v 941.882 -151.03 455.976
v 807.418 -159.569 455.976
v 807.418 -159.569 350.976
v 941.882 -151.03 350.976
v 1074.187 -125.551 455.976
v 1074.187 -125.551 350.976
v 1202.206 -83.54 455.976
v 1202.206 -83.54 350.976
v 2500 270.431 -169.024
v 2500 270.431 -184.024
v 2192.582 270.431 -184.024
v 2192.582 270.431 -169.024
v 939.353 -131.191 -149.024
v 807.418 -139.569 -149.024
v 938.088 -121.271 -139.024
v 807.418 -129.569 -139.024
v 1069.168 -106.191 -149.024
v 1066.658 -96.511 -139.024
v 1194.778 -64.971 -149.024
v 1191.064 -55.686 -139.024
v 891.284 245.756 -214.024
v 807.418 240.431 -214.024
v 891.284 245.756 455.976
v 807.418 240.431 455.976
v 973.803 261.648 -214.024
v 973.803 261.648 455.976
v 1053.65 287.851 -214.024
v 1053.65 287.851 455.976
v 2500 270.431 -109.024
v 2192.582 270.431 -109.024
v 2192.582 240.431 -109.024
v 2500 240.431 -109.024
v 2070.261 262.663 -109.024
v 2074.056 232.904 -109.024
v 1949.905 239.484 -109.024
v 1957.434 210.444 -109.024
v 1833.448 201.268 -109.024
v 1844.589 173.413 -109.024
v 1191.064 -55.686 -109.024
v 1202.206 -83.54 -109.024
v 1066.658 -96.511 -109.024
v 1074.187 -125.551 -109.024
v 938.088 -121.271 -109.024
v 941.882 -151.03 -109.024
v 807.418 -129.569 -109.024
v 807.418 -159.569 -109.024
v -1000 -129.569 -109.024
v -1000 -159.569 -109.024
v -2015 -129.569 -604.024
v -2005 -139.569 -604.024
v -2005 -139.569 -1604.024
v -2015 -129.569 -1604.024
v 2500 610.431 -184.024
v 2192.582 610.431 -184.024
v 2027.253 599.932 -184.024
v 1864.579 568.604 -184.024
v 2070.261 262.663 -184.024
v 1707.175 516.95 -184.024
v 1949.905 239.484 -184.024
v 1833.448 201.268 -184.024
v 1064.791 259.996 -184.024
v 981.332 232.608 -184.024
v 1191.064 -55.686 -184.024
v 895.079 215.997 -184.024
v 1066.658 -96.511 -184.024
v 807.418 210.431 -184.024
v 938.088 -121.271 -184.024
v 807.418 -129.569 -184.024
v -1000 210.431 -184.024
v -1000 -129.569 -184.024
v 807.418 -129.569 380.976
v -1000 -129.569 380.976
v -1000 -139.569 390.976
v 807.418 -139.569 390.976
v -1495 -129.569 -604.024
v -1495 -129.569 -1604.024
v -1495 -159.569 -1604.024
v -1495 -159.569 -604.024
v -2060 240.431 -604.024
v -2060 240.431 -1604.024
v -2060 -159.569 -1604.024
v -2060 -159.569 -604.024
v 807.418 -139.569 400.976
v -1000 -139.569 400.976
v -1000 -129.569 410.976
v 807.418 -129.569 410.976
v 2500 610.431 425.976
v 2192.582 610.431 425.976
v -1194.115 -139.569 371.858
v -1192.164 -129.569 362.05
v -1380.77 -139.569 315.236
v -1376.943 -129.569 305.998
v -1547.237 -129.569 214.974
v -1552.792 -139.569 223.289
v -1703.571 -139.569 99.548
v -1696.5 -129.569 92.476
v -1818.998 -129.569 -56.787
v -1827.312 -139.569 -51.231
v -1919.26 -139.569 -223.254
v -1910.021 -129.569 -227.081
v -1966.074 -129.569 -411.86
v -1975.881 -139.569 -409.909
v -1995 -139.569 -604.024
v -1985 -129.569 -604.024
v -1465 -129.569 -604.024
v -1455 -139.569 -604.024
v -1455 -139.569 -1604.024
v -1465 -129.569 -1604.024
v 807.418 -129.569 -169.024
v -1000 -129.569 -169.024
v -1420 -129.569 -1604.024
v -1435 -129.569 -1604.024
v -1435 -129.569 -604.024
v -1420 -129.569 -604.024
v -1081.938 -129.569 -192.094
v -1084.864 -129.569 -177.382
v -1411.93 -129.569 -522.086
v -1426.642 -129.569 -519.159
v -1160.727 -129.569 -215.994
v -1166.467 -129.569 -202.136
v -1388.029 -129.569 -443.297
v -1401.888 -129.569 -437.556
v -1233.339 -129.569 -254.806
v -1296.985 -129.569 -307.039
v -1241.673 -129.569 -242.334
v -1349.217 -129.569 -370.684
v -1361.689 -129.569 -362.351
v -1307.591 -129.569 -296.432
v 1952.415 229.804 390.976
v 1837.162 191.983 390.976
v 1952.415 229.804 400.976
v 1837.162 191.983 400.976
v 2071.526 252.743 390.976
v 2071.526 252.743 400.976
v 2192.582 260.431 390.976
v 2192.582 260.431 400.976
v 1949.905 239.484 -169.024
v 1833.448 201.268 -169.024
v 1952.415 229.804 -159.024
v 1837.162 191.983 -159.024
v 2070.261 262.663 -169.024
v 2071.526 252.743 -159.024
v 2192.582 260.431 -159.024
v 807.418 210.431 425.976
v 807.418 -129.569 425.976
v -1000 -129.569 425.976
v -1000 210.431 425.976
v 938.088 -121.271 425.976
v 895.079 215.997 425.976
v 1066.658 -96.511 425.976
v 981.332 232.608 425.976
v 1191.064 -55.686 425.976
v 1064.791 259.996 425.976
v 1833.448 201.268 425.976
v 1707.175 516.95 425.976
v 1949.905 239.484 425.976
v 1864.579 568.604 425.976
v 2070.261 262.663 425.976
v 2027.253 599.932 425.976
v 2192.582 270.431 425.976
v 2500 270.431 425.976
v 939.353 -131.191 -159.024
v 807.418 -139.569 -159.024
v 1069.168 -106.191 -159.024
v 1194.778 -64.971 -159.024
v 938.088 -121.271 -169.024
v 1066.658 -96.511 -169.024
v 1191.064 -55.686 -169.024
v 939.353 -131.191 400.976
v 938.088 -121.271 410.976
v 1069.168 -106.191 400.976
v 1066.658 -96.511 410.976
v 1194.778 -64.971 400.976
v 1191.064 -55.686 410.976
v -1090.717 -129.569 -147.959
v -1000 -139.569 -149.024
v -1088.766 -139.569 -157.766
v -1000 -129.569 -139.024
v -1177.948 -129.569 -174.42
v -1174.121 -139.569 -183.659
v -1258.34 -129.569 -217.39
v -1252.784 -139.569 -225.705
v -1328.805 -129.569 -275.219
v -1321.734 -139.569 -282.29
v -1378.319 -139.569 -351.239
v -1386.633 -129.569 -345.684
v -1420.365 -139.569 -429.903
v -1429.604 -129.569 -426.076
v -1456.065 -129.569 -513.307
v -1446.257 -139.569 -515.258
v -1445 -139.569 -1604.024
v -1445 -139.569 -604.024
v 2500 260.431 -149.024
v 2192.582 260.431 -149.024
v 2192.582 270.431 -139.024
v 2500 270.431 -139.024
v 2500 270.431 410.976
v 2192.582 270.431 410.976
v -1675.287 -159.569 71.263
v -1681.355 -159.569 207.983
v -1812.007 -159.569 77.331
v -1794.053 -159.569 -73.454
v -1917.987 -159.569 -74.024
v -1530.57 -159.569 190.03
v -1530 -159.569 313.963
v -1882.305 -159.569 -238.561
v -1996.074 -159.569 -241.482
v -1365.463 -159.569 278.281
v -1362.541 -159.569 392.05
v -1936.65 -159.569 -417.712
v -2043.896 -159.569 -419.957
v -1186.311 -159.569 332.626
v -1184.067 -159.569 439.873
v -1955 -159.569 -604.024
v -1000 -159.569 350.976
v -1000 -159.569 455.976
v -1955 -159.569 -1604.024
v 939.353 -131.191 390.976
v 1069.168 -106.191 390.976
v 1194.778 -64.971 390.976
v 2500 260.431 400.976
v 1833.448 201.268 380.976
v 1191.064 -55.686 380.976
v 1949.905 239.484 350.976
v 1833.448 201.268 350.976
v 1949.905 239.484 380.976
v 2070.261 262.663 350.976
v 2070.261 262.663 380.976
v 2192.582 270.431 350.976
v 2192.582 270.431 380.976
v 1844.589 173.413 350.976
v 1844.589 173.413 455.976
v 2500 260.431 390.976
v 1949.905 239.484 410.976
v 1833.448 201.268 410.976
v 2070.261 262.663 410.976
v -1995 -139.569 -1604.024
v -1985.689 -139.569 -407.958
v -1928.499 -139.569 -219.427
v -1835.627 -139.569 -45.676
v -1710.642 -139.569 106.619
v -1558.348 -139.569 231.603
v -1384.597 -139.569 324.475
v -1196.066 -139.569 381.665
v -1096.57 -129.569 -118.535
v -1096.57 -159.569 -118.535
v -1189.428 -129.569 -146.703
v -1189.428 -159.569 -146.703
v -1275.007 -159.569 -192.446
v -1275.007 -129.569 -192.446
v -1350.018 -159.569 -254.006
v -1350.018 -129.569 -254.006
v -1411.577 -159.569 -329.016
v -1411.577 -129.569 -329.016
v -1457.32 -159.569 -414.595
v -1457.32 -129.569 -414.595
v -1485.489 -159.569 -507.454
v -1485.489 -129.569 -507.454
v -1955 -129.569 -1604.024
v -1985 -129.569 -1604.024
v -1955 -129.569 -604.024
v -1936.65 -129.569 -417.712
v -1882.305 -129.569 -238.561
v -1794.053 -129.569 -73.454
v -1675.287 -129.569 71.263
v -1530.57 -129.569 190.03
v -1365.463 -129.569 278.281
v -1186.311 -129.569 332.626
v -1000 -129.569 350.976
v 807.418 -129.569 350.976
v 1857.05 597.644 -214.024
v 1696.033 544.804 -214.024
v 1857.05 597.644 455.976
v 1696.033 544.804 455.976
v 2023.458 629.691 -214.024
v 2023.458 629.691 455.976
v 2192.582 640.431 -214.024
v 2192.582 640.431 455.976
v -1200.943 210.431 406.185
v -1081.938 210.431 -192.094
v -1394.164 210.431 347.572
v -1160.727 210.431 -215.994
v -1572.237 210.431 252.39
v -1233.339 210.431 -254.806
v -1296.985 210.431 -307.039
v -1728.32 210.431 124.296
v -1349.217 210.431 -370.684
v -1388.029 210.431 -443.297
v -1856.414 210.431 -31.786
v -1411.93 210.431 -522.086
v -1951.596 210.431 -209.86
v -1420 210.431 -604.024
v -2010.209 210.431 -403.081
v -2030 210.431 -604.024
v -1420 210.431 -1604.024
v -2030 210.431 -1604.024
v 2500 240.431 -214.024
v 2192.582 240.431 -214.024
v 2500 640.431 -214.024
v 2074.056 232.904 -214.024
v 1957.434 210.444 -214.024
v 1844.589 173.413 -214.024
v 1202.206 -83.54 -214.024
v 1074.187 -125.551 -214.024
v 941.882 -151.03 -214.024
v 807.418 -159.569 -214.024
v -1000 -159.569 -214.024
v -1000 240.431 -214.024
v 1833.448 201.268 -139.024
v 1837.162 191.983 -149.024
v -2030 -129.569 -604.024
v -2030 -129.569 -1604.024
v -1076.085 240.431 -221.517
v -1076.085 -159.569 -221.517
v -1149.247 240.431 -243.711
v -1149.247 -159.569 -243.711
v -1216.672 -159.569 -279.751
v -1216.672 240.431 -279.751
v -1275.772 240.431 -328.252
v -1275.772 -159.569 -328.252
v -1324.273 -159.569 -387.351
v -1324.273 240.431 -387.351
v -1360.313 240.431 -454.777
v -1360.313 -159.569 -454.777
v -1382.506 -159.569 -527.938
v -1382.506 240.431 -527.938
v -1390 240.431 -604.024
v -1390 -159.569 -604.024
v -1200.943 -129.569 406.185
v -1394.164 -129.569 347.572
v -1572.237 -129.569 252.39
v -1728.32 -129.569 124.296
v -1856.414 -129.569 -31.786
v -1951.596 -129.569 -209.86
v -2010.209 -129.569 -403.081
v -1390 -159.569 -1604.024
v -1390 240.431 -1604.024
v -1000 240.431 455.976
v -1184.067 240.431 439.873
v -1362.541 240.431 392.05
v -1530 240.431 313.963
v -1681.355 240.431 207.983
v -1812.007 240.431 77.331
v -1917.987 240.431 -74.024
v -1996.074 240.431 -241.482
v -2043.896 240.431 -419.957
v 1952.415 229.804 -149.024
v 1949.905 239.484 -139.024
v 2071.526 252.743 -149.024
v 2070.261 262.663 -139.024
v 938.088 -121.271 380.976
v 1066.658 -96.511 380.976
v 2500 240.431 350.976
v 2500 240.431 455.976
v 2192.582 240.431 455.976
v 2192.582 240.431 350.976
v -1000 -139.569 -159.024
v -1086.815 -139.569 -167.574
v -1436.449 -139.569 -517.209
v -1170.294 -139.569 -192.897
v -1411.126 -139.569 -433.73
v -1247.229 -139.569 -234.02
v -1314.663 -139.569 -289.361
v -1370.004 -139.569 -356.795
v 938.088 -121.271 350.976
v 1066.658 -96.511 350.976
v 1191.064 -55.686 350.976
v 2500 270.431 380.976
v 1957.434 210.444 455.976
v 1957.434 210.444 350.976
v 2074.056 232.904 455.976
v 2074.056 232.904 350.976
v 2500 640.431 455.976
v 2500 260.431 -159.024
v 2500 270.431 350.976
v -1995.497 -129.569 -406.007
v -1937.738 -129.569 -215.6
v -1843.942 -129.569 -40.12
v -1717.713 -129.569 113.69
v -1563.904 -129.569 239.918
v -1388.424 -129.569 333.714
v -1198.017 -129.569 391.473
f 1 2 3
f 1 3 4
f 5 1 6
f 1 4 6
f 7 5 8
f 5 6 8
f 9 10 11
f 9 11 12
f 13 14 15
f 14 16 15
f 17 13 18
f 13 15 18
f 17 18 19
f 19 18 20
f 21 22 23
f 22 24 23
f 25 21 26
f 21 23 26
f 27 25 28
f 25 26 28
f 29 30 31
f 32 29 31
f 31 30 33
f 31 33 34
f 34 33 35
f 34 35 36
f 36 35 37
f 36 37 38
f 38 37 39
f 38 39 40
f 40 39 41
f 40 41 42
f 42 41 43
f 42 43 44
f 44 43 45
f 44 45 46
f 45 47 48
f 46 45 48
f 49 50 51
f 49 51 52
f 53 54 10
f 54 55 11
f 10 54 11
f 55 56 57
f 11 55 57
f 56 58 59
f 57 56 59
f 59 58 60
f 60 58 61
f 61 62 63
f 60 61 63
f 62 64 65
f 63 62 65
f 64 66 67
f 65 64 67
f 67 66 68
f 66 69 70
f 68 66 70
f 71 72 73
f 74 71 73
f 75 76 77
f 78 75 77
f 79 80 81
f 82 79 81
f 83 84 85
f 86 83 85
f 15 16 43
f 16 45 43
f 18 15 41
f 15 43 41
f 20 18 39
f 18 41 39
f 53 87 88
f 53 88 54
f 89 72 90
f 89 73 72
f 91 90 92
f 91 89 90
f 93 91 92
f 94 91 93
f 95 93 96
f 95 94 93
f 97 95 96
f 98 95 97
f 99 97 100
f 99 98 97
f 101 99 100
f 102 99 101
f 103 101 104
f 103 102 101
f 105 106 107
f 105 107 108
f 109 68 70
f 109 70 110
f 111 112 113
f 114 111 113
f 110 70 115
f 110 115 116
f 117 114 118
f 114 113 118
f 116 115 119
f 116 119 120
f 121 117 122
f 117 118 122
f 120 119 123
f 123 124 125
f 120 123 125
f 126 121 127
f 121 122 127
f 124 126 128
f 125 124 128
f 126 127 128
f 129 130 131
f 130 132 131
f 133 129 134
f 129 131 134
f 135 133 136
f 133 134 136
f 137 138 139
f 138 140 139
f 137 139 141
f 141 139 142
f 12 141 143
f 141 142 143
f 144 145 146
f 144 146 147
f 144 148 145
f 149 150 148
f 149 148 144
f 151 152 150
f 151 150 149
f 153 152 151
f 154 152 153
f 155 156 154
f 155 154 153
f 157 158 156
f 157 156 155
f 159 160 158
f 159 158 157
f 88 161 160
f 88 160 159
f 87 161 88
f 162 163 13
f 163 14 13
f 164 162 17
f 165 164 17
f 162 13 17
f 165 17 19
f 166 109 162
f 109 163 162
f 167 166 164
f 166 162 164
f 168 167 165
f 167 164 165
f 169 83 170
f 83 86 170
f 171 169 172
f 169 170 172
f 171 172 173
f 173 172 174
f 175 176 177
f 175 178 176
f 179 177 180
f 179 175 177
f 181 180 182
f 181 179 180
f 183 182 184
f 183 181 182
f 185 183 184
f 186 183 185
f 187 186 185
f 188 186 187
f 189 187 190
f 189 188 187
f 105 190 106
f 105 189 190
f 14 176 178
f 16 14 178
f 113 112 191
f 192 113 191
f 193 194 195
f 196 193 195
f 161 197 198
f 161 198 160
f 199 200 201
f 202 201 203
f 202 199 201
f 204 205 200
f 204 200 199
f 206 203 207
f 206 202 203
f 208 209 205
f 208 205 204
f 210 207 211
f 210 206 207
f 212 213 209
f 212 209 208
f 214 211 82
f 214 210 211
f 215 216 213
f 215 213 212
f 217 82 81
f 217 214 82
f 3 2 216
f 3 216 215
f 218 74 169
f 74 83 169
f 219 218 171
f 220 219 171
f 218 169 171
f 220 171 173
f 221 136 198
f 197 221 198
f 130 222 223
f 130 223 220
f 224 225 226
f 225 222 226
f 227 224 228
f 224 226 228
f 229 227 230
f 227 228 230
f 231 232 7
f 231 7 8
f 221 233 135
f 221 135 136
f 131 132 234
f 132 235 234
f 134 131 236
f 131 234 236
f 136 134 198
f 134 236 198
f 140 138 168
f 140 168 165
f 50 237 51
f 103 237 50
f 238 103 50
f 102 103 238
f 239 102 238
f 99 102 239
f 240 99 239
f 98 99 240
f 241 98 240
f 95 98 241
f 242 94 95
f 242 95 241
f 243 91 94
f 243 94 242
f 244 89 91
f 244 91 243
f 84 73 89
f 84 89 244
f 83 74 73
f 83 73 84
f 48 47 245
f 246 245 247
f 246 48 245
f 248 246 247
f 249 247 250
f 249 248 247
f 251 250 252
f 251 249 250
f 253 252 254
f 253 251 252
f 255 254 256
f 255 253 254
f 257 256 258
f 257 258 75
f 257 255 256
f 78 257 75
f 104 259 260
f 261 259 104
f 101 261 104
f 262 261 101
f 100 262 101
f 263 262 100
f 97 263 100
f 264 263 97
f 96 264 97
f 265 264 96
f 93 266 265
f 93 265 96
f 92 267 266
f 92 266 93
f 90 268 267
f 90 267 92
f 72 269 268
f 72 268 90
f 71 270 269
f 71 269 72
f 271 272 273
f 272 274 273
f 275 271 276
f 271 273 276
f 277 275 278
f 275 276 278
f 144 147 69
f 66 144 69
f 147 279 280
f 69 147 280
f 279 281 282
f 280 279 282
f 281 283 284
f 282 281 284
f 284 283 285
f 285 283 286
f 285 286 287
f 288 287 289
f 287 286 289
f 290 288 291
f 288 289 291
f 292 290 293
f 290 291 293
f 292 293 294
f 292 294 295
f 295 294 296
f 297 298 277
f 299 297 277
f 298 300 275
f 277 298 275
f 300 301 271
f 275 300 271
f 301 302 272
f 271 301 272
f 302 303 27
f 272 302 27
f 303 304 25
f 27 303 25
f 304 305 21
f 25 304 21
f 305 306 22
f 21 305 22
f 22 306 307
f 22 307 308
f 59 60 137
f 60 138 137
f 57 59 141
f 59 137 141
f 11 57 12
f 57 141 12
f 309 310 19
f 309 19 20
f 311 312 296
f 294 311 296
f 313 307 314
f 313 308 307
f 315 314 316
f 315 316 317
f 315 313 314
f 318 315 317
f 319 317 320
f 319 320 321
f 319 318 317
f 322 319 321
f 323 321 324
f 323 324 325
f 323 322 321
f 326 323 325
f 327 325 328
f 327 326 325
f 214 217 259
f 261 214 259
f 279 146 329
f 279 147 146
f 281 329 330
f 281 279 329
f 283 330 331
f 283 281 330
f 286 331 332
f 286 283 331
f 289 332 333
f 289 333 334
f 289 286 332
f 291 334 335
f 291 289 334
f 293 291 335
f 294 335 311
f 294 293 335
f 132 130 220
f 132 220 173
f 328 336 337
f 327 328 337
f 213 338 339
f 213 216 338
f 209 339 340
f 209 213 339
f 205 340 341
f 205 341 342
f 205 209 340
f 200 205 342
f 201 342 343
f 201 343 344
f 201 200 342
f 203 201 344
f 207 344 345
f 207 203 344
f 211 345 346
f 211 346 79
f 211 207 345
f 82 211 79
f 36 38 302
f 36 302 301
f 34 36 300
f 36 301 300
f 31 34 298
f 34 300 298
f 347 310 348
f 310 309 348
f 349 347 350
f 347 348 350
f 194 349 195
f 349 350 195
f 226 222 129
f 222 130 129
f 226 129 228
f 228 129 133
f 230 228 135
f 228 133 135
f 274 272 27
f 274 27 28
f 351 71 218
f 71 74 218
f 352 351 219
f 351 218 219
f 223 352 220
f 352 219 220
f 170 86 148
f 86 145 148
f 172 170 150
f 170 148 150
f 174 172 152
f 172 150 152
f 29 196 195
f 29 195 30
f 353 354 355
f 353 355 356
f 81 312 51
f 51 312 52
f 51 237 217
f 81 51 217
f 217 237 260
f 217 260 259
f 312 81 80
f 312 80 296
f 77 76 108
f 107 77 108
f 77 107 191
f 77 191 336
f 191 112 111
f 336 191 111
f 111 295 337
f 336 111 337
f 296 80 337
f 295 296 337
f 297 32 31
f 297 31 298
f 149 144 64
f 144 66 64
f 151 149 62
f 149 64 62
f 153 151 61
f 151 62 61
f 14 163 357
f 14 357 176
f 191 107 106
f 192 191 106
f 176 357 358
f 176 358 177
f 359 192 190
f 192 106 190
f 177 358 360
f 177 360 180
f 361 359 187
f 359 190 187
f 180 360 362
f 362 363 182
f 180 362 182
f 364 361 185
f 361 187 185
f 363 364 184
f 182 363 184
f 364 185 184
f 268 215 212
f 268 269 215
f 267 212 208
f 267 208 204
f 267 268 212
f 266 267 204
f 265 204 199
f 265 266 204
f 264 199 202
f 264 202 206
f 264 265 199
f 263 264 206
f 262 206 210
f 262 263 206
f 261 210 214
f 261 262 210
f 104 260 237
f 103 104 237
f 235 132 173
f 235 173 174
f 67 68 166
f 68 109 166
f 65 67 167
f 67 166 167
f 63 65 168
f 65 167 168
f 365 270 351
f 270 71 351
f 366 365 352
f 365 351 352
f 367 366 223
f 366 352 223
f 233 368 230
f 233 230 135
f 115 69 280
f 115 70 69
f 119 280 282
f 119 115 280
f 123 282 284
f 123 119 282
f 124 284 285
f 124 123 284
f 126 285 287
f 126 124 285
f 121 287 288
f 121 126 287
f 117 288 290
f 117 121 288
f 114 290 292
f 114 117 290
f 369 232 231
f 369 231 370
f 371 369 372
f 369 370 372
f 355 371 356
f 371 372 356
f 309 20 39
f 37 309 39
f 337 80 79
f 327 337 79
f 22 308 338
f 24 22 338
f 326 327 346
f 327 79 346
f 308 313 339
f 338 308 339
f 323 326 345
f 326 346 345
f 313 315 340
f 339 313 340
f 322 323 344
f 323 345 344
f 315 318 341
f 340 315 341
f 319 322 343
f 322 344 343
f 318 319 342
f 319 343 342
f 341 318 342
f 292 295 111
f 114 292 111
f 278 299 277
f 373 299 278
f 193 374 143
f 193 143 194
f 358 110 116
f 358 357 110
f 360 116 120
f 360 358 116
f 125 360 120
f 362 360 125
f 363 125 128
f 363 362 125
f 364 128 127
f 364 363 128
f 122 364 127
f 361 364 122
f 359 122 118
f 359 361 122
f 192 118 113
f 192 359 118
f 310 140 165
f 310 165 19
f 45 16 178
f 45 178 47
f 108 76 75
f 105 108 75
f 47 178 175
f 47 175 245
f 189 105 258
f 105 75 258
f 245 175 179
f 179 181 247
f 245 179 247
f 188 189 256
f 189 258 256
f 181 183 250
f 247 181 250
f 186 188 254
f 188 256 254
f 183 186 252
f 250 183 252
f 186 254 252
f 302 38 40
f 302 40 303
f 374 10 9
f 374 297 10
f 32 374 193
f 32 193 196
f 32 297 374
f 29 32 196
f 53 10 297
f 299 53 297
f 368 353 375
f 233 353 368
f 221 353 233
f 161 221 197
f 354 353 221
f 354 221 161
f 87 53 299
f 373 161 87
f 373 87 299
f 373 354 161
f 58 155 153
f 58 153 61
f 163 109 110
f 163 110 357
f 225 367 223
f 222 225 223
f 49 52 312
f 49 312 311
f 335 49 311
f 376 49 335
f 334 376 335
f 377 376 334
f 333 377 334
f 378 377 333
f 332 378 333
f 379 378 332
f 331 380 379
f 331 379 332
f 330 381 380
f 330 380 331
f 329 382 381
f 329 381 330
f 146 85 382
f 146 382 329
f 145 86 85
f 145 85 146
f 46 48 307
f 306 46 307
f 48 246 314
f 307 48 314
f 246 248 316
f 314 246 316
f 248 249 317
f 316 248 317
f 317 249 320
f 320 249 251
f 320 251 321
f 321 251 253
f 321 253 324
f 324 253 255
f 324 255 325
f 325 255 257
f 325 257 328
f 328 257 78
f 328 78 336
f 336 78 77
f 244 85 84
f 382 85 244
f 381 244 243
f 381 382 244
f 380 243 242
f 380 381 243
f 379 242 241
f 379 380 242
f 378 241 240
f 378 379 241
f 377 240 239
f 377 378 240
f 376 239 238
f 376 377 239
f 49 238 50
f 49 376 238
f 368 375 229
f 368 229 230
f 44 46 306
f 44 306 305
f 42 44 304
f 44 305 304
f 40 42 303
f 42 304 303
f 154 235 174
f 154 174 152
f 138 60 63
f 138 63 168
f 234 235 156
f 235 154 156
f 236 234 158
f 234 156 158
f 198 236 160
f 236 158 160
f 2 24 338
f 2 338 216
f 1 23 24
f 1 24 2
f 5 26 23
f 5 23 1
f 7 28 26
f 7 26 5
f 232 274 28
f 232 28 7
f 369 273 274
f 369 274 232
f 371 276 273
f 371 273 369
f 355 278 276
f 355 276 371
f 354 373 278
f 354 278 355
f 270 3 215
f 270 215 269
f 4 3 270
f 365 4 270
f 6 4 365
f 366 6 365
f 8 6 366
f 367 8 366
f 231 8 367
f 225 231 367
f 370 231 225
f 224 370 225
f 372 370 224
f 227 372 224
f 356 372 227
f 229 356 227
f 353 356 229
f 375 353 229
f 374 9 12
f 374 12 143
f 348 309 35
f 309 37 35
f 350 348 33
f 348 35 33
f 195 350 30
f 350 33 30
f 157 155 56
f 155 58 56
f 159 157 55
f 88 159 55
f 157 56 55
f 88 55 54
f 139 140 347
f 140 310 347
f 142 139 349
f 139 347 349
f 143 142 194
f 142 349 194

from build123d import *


with BuildPart() as part:
    # Sweep15: sweep along a path in Sketch4
    with BuildLine(Plane(origin=(0, -96.56937012, 0), x_dir=(1, 0, 0), z_dir=(0, 1, 0))) as sweep15_path:
        Line((0, -395.976291919), (-1000, -395.976291919))
        ThreePointArc((-1000, -395.976291919), (-1707.106781187, -103.083073106), (-2000, 604.023708081))
        Line((-2000, 604.023708081), (-2000, 1604.023708081))
    # Sketch3 → Sweep15 (sweep)
    with BuildSketch(Plane(origin=(0, 0, 0), x_dir=(0, 0, -1), z_dir=(1, 0, 0))):
        Polygon((-380.976291919, -129.569370117), (-390.976291919, -139.569370117), (-400.976291919, -139.569370117), (-410.976291919, -129.569370117), (-425.976291919, -129.569370117), (-425.976291919, 210.430629883), (184.023708081, 210.430629883), (184.023708081, -129.569370117), (169.023708081, -129.569370117), (159.023708081, -139.569370117), (149.023708081, -139.569370117), (139.023708081, -129.569370117), (109.023708081, -129.569370117), (109.023708081, -159.569370117), (214.023708081, -159.569370117), (214.023708081, 240.430629883), (-455.976291919, 240.430629883), (-455.976291919, -159.569370117), (-350.976291919, -159.569370117), (-350.976291919, -129.569370117), align=None)
    sweep(path=sweep15_path.line)

    # Sweep18: sweep along a path in Sketch20
    with BuildLine(Plane(origin=(0, 0, 395.976291919), x_dir=(-1, 0, 0), z_dir=(0, 0, -1))) as sweep18_path:
        Line((0, -96.569370117), (-807.417596433, -96.569370117))
        ThreePointArc((-807.417596433, -96.569370117), (-996.525117588, -78.525756848), (-1178.808272787, -25.046061002))
        Line((-1178.808272787, -25.046061002), (-1821.191727213, 231.907320768))
        ThreePointArc((-1821.191727213, 231.907320768), (-2003.474882412, 285.387016615), (-2192.582403567, 303.430629883))
        Line((-2192.582403567, 303.430629883), (-2500, 303.430629883))
    # Sketch3<10> → Sweep18 (sweep)
    with BuildSketch(Plane(origin=(0, 0, 0), x_dir=(0, 0, -1), z_dir=(1, 0, 0))):
        Polygon((-380.976291919, -129.569370117), (-390.976291919, -139.569370117), (-400.976291919, -139.569370117), (-410.976291919, -129.569370117), (-425.976291919, -129.569370117), (-425.976291919, 210.430629883), (184.023708081, 210.430629883), (184.023708081, -129.569370117), (169.023708081, -129.569370117), (159.023708081, -139.569370117), (149.023708081, -139.569370117), (139.023708081, -129.569370117), (109.023708081, -129.569370117), (109.023708081, -159.569370117), (214.023708081, -159.569370117), (214.023708081, 240.430629883), (-455.976291919, 240.430629883), (-455.976291919, -159.569370117), (-350.976291919, -159.569370117), (-350.976291919, -129.569370117), align=None)
    sweep(path=sweep18_path.line)


solid = part.part
